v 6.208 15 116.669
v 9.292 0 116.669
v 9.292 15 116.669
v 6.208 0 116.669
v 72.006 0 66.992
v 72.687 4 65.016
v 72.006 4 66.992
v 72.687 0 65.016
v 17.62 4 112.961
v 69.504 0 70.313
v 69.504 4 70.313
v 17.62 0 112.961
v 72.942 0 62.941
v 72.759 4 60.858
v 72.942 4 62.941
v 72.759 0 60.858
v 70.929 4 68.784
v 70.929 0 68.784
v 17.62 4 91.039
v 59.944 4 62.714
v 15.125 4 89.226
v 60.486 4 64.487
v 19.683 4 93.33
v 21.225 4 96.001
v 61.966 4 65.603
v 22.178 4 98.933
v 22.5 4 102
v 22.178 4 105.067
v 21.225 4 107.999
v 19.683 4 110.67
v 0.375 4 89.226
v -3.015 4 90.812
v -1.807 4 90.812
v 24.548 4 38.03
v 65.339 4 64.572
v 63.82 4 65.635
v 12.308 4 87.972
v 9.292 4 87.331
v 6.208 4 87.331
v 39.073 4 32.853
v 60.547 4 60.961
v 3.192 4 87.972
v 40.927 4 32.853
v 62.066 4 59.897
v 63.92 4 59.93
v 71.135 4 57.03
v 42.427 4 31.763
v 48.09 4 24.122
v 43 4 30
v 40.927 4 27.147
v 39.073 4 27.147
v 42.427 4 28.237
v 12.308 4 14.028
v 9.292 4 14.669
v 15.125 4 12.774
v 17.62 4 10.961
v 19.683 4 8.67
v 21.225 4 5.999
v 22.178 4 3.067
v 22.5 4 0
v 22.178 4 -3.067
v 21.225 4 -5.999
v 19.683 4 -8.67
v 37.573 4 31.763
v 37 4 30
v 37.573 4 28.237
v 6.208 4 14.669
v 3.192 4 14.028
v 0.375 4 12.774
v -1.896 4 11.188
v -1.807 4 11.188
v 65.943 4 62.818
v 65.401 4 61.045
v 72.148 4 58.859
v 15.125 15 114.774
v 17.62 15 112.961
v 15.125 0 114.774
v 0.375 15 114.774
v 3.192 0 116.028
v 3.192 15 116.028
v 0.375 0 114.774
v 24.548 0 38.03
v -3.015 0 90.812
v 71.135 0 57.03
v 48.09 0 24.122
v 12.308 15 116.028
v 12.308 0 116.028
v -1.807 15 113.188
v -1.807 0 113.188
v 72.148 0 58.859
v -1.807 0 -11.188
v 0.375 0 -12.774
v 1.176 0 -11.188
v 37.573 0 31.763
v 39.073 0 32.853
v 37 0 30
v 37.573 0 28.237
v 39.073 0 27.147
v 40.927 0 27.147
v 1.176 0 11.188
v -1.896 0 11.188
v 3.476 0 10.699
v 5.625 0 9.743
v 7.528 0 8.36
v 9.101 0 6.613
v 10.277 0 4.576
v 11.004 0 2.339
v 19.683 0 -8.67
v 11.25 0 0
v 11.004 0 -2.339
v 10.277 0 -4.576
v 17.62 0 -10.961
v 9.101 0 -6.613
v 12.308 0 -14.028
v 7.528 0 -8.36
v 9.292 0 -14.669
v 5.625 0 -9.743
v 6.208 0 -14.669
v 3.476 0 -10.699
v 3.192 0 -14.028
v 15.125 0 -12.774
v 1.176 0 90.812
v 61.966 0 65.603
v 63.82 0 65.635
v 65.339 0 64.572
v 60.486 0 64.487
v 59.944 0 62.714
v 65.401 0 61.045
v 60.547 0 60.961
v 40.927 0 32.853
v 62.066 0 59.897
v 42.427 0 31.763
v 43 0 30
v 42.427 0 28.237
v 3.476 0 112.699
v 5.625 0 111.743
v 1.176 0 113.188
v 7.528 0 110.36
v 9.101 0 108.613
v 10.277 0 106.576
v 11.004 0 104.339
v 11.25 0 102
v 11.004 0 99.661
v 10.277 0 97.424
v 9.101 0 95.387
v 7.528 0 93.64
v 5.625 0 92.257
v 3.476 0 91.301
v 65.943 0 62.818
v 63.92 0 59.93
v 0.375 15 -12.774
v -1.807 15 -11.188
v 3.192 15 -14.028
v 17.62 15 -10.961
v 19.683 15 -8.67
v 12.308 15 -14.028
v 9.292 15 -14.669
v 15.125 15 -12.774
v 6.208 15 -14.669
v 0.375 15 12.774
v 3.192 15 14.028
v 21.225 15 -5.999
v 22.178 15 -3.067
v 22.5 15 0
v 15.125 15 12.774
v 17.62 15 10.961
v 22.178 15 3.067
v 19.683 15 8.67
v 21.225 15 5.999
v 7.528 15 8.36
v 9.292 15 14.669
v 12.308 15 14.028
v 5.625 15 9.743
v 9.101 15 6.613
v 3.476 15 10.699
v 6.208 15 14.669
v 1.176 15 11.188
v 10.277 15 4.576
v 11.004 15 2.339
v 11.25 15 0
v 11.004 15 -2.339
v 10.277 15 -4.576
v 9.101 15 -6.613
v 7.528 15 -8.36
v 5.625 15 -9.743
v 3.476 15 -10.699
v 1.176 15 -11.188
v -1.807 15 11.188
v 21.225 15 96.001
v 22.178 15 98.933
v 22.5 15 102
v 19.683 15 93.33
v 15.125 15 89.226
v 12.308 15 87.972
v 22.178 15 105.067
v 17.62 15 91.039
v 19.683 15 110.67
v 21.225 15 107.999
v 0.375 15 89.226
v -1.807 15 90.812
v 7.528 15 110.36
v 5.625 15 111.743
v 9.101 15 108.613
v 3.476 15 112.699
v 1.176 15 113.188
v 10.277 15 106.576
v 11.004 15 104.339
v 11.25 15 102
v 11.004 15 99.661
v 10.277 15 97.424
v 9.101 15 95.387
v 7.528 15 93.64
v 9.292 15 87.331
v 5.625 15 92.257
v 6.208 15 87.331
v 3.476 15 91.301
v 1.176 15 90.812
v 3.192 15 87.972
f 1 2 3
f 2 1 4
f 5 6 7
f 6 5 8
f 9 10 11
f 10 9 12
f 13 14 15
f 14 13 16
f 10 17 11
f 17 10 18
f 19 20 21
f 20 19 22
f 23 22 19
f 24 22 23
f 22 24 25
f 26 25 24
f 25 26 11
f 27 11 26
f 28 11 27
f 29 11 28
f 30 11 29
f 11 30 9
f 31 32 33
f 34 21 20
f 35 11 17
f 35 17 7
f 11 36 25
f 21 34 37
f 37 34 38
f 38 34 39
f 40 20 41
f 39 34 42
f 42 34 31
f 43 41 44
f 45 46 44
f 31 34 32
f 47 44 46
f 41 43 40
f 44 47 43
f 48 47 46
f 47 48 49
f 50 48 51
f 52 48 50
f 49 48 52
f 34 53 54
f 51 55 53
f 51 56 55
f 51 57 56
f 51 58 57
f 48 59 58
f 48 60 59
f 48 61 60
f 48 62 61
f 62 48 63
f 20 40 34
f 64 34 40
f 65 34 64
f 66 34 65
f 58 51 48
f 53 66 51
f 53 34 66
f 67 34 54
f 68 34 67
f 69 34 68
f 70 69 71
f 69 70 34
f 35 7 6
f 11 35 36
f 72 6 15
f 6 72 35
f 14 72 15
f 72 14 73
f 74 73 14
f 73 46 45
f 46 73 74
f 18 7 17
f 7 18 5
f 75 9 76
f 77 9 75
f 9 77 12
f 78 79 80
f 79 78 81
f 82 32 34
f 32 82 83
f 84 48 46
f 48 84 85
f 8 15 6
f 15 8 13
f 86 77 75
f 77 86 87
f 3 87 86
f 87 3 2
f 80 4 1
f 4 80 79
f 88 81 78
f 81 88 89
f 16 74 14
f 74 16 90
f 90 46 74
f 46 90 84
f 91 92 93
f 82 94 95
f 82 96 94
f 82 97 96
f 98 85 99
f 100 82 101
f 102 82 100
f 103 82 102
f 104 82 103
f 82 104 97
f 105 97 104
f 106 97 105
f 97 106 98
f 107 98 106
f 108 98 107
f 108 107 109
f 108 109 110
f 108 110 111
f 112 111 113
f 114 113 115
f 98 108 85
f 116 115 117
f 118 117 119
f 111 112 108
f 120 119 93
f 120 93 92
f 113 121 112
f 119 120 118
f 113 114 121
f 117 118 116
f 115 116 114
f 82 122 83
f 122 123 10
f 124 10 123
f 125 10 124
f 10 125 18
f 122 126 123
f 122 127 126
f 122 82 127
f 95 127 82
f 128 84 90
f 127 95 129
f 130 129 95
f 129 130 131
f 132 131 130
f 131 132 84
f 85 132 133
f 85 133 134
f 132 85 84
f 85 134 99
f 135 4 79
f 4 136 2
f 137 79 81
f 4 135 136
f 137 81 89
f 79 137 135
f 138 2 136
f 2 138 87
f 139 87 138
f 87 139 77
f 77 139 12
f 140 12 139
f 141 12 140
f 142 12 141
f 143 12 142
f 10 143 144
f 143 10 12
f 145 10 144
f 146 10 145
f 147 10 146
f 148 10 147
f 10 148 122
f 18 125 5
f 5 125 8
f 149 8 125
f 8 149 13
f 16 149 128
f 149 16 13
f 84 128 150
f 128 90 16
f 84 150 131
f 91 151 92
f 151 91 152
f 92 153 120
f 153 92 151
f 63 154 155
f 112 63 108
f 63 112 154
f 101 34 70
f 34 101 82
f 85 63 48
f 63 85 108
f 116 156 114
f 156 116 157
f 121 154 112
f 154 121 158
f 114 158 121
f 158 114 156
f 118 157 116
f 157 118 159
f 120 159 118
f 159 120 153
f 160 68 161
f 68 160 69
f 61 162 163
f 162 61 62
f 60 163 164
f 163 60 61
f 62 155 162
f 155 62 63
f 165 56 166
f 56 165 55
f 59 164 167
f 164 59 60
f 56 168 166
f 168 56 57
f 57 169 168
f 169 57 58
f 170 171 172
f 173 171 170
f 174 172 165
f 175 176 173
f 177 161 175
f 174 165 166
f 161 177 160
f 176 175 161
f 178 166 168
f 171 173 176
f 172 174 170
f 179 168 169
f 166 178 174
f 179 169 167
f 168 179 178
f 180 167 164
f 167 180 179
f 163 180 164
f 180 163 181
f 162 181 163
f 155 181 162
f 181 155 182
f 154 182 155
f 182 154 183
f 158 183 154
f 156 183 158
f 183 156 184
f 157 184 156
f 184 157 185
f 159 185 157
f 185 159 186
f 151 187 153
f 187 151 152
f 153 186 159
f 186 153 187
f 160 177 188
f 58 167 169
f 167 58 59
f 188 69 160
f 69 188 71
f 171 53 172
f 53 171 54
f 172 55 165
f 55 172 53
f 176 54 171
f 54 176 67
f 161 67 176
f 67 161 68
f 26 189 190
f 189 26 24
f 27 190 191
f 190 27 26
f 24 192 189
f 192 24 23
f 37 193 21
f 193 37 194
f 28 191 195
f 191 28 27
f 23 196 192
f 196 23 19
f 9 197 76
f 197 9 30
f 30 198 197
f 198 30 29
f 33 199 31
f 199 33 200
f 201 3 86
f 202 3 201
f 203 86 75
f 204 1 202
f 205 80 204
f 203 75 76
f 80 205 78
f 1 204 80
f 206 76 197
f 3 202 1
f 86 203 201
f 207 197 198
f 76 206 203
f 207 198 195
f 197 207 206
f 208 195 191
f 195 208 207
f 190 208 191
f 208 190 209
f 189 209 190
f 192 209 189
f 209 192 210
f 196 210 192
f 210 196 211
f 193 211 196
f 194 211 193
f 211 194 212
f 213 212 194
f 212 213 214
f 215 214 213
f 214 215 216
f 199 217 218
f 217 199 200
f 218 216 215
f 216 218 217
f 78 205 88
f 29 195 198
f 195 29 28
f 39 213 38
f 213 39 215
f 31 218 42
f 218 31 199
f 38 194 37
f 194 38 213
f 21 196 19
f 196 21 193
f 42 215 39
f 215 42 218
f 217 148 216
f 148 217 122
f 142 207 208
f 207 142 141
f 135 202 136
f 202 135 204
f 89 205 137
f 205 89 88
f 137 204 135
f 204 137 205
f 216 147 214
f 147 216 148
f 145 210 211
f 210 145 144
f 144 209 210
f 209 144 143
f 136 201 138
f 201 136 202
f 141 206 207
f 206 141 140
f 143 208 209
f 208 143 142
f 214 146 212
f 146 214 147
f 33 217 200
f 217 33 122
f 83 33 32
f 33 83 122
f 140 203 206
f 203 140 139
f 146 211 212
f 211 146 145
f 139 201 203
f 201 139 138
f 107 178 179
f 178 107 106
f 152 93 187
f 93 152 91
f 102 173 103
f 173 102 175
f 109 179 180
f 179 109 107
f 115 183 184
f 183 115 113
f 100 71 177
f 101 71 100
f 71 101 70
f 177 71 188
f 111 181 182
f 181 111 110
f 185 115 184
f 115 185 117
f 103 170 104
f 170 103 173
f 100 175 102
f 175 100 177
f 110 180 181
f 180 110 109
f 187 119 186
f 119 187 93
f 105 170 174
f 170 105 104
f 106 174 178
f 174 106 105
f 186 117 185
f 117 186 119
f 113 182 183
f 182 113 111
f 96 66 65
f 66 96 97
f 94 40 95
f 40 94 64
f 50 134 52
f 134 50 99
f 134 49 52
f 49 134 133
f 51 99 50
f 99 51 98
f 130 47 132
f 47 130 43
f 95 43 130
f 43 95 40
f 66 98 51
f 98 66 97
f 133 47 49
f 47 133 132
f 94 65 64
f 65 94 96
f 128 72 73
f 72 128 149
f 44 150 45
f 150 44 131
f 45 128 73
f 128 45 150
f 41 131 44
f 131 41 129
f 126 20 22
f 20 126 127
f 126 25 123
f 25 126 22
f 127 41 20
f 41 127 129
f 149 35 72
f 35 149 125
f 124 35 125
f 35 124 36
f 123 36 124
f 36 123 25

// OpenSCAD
tube=22.5;
tube_h=15;
wall=7;
tube_outer=tube+wall*2;
tube_gap=102;

screw=6;
screw_h=4;
screw_wall=wall;
screw_outer=screw_wall*2+screw;
light_gap=40;

angle=35;
options=3;
option=4;
zip=4;


diff_x=40;
diff_y=0;
diff_z=30;

pad=0.1;
padd=pad*2;

module tube_bottom() {
    rotate([-90,0,0])
    cylinder(d=tube_outer,h=tube_h);
}


module tube_top() {
    translate([0,0,tube_gap])
    rotate([-90,0,0])
    cylinder(d=tube_outer,h=tube_h);

}

module light_bottom() {
    translate([diff_x,diff_y,diff_z]) 
    rotate([-90,0,0])
    cylinder(d=screw_outer,h=screw_h);
}

module light_top() {
    translate([diff_x,diff_y,diff_z]) 
    rotate([0,angle,0])
    translate([0,0,light_gap])
    rotate([-90,0,0])
    cylinder(d=screw_outer,h=screw_h);
}
module bar() {
    hull() {
        light_bottom();
        light_top();
    }
}

module sliver() {
    difference() {
        translate([0,0,pad])
        bar();
        bar();
    }
}
module positive() {
    hull() {
        translate([tube/2+wall/2-wall,0,tube_gap])
        rotate([-90,0,0])
        cylinder(d=tube+wall,h=screw_h);
        bar();
    }
    hull() {
    translate([tube/2+wall/2-wall,0,0])
    rotate([-90,0,0])
    cylinder(d=tube+wall,h=screw_h);
        bar();
    }
    //tube_top();
    //tube_bottom();
    translate([tube/2+wall/2-wall,0,0])
    rotate([-90,0,0])
    cylinder(d=tube+wall,h=tube_h);

    translate([tube/2+wall/2-wall,0,tube_gap])
    rotate([-90,0,0])
    cylinder(d=tube+wall,h=tube_h);

}

difference() {
    positive();

    translate([0,-pad,0])
    translate([0,0,tube_gap])
    rotate([-90,0,0])
    hull() {
        cylinder(d=tube,h=tube_h*2);
        translate([-tube_outer,0,0])
        cylinder(d=tube,h=tube_h*2);
    }

    hull() {
        translate([-tube_outer,0,0])
        translate([0,-pad,0])
        rotate([-90,0,0])
        cylinder(d=tube,h=tube_h*2);

        translate([0,-pad,0])
        rotate([-90,0,0])
        cylinder(d=tube,h=tube_h*2);
    }
    //translate([-tube_outer,screw_h,-tube_outer])
    //cube([tube_outer,zip,tube_gap+tube_outer*2]);
    translate([diff_x,diff_y,diff_z]) 
    rotate([-90,0,0])
    cylinder(d=screw,h=screw_h+padd);

    translate([diff_x,diff_y,diff_z]) 
    rotate([0,angle,0])
    translate([0,0,light_gap])
    rotate([-90,0,0])
    cylinder(d=screw,h=screw_h+padd);


}
